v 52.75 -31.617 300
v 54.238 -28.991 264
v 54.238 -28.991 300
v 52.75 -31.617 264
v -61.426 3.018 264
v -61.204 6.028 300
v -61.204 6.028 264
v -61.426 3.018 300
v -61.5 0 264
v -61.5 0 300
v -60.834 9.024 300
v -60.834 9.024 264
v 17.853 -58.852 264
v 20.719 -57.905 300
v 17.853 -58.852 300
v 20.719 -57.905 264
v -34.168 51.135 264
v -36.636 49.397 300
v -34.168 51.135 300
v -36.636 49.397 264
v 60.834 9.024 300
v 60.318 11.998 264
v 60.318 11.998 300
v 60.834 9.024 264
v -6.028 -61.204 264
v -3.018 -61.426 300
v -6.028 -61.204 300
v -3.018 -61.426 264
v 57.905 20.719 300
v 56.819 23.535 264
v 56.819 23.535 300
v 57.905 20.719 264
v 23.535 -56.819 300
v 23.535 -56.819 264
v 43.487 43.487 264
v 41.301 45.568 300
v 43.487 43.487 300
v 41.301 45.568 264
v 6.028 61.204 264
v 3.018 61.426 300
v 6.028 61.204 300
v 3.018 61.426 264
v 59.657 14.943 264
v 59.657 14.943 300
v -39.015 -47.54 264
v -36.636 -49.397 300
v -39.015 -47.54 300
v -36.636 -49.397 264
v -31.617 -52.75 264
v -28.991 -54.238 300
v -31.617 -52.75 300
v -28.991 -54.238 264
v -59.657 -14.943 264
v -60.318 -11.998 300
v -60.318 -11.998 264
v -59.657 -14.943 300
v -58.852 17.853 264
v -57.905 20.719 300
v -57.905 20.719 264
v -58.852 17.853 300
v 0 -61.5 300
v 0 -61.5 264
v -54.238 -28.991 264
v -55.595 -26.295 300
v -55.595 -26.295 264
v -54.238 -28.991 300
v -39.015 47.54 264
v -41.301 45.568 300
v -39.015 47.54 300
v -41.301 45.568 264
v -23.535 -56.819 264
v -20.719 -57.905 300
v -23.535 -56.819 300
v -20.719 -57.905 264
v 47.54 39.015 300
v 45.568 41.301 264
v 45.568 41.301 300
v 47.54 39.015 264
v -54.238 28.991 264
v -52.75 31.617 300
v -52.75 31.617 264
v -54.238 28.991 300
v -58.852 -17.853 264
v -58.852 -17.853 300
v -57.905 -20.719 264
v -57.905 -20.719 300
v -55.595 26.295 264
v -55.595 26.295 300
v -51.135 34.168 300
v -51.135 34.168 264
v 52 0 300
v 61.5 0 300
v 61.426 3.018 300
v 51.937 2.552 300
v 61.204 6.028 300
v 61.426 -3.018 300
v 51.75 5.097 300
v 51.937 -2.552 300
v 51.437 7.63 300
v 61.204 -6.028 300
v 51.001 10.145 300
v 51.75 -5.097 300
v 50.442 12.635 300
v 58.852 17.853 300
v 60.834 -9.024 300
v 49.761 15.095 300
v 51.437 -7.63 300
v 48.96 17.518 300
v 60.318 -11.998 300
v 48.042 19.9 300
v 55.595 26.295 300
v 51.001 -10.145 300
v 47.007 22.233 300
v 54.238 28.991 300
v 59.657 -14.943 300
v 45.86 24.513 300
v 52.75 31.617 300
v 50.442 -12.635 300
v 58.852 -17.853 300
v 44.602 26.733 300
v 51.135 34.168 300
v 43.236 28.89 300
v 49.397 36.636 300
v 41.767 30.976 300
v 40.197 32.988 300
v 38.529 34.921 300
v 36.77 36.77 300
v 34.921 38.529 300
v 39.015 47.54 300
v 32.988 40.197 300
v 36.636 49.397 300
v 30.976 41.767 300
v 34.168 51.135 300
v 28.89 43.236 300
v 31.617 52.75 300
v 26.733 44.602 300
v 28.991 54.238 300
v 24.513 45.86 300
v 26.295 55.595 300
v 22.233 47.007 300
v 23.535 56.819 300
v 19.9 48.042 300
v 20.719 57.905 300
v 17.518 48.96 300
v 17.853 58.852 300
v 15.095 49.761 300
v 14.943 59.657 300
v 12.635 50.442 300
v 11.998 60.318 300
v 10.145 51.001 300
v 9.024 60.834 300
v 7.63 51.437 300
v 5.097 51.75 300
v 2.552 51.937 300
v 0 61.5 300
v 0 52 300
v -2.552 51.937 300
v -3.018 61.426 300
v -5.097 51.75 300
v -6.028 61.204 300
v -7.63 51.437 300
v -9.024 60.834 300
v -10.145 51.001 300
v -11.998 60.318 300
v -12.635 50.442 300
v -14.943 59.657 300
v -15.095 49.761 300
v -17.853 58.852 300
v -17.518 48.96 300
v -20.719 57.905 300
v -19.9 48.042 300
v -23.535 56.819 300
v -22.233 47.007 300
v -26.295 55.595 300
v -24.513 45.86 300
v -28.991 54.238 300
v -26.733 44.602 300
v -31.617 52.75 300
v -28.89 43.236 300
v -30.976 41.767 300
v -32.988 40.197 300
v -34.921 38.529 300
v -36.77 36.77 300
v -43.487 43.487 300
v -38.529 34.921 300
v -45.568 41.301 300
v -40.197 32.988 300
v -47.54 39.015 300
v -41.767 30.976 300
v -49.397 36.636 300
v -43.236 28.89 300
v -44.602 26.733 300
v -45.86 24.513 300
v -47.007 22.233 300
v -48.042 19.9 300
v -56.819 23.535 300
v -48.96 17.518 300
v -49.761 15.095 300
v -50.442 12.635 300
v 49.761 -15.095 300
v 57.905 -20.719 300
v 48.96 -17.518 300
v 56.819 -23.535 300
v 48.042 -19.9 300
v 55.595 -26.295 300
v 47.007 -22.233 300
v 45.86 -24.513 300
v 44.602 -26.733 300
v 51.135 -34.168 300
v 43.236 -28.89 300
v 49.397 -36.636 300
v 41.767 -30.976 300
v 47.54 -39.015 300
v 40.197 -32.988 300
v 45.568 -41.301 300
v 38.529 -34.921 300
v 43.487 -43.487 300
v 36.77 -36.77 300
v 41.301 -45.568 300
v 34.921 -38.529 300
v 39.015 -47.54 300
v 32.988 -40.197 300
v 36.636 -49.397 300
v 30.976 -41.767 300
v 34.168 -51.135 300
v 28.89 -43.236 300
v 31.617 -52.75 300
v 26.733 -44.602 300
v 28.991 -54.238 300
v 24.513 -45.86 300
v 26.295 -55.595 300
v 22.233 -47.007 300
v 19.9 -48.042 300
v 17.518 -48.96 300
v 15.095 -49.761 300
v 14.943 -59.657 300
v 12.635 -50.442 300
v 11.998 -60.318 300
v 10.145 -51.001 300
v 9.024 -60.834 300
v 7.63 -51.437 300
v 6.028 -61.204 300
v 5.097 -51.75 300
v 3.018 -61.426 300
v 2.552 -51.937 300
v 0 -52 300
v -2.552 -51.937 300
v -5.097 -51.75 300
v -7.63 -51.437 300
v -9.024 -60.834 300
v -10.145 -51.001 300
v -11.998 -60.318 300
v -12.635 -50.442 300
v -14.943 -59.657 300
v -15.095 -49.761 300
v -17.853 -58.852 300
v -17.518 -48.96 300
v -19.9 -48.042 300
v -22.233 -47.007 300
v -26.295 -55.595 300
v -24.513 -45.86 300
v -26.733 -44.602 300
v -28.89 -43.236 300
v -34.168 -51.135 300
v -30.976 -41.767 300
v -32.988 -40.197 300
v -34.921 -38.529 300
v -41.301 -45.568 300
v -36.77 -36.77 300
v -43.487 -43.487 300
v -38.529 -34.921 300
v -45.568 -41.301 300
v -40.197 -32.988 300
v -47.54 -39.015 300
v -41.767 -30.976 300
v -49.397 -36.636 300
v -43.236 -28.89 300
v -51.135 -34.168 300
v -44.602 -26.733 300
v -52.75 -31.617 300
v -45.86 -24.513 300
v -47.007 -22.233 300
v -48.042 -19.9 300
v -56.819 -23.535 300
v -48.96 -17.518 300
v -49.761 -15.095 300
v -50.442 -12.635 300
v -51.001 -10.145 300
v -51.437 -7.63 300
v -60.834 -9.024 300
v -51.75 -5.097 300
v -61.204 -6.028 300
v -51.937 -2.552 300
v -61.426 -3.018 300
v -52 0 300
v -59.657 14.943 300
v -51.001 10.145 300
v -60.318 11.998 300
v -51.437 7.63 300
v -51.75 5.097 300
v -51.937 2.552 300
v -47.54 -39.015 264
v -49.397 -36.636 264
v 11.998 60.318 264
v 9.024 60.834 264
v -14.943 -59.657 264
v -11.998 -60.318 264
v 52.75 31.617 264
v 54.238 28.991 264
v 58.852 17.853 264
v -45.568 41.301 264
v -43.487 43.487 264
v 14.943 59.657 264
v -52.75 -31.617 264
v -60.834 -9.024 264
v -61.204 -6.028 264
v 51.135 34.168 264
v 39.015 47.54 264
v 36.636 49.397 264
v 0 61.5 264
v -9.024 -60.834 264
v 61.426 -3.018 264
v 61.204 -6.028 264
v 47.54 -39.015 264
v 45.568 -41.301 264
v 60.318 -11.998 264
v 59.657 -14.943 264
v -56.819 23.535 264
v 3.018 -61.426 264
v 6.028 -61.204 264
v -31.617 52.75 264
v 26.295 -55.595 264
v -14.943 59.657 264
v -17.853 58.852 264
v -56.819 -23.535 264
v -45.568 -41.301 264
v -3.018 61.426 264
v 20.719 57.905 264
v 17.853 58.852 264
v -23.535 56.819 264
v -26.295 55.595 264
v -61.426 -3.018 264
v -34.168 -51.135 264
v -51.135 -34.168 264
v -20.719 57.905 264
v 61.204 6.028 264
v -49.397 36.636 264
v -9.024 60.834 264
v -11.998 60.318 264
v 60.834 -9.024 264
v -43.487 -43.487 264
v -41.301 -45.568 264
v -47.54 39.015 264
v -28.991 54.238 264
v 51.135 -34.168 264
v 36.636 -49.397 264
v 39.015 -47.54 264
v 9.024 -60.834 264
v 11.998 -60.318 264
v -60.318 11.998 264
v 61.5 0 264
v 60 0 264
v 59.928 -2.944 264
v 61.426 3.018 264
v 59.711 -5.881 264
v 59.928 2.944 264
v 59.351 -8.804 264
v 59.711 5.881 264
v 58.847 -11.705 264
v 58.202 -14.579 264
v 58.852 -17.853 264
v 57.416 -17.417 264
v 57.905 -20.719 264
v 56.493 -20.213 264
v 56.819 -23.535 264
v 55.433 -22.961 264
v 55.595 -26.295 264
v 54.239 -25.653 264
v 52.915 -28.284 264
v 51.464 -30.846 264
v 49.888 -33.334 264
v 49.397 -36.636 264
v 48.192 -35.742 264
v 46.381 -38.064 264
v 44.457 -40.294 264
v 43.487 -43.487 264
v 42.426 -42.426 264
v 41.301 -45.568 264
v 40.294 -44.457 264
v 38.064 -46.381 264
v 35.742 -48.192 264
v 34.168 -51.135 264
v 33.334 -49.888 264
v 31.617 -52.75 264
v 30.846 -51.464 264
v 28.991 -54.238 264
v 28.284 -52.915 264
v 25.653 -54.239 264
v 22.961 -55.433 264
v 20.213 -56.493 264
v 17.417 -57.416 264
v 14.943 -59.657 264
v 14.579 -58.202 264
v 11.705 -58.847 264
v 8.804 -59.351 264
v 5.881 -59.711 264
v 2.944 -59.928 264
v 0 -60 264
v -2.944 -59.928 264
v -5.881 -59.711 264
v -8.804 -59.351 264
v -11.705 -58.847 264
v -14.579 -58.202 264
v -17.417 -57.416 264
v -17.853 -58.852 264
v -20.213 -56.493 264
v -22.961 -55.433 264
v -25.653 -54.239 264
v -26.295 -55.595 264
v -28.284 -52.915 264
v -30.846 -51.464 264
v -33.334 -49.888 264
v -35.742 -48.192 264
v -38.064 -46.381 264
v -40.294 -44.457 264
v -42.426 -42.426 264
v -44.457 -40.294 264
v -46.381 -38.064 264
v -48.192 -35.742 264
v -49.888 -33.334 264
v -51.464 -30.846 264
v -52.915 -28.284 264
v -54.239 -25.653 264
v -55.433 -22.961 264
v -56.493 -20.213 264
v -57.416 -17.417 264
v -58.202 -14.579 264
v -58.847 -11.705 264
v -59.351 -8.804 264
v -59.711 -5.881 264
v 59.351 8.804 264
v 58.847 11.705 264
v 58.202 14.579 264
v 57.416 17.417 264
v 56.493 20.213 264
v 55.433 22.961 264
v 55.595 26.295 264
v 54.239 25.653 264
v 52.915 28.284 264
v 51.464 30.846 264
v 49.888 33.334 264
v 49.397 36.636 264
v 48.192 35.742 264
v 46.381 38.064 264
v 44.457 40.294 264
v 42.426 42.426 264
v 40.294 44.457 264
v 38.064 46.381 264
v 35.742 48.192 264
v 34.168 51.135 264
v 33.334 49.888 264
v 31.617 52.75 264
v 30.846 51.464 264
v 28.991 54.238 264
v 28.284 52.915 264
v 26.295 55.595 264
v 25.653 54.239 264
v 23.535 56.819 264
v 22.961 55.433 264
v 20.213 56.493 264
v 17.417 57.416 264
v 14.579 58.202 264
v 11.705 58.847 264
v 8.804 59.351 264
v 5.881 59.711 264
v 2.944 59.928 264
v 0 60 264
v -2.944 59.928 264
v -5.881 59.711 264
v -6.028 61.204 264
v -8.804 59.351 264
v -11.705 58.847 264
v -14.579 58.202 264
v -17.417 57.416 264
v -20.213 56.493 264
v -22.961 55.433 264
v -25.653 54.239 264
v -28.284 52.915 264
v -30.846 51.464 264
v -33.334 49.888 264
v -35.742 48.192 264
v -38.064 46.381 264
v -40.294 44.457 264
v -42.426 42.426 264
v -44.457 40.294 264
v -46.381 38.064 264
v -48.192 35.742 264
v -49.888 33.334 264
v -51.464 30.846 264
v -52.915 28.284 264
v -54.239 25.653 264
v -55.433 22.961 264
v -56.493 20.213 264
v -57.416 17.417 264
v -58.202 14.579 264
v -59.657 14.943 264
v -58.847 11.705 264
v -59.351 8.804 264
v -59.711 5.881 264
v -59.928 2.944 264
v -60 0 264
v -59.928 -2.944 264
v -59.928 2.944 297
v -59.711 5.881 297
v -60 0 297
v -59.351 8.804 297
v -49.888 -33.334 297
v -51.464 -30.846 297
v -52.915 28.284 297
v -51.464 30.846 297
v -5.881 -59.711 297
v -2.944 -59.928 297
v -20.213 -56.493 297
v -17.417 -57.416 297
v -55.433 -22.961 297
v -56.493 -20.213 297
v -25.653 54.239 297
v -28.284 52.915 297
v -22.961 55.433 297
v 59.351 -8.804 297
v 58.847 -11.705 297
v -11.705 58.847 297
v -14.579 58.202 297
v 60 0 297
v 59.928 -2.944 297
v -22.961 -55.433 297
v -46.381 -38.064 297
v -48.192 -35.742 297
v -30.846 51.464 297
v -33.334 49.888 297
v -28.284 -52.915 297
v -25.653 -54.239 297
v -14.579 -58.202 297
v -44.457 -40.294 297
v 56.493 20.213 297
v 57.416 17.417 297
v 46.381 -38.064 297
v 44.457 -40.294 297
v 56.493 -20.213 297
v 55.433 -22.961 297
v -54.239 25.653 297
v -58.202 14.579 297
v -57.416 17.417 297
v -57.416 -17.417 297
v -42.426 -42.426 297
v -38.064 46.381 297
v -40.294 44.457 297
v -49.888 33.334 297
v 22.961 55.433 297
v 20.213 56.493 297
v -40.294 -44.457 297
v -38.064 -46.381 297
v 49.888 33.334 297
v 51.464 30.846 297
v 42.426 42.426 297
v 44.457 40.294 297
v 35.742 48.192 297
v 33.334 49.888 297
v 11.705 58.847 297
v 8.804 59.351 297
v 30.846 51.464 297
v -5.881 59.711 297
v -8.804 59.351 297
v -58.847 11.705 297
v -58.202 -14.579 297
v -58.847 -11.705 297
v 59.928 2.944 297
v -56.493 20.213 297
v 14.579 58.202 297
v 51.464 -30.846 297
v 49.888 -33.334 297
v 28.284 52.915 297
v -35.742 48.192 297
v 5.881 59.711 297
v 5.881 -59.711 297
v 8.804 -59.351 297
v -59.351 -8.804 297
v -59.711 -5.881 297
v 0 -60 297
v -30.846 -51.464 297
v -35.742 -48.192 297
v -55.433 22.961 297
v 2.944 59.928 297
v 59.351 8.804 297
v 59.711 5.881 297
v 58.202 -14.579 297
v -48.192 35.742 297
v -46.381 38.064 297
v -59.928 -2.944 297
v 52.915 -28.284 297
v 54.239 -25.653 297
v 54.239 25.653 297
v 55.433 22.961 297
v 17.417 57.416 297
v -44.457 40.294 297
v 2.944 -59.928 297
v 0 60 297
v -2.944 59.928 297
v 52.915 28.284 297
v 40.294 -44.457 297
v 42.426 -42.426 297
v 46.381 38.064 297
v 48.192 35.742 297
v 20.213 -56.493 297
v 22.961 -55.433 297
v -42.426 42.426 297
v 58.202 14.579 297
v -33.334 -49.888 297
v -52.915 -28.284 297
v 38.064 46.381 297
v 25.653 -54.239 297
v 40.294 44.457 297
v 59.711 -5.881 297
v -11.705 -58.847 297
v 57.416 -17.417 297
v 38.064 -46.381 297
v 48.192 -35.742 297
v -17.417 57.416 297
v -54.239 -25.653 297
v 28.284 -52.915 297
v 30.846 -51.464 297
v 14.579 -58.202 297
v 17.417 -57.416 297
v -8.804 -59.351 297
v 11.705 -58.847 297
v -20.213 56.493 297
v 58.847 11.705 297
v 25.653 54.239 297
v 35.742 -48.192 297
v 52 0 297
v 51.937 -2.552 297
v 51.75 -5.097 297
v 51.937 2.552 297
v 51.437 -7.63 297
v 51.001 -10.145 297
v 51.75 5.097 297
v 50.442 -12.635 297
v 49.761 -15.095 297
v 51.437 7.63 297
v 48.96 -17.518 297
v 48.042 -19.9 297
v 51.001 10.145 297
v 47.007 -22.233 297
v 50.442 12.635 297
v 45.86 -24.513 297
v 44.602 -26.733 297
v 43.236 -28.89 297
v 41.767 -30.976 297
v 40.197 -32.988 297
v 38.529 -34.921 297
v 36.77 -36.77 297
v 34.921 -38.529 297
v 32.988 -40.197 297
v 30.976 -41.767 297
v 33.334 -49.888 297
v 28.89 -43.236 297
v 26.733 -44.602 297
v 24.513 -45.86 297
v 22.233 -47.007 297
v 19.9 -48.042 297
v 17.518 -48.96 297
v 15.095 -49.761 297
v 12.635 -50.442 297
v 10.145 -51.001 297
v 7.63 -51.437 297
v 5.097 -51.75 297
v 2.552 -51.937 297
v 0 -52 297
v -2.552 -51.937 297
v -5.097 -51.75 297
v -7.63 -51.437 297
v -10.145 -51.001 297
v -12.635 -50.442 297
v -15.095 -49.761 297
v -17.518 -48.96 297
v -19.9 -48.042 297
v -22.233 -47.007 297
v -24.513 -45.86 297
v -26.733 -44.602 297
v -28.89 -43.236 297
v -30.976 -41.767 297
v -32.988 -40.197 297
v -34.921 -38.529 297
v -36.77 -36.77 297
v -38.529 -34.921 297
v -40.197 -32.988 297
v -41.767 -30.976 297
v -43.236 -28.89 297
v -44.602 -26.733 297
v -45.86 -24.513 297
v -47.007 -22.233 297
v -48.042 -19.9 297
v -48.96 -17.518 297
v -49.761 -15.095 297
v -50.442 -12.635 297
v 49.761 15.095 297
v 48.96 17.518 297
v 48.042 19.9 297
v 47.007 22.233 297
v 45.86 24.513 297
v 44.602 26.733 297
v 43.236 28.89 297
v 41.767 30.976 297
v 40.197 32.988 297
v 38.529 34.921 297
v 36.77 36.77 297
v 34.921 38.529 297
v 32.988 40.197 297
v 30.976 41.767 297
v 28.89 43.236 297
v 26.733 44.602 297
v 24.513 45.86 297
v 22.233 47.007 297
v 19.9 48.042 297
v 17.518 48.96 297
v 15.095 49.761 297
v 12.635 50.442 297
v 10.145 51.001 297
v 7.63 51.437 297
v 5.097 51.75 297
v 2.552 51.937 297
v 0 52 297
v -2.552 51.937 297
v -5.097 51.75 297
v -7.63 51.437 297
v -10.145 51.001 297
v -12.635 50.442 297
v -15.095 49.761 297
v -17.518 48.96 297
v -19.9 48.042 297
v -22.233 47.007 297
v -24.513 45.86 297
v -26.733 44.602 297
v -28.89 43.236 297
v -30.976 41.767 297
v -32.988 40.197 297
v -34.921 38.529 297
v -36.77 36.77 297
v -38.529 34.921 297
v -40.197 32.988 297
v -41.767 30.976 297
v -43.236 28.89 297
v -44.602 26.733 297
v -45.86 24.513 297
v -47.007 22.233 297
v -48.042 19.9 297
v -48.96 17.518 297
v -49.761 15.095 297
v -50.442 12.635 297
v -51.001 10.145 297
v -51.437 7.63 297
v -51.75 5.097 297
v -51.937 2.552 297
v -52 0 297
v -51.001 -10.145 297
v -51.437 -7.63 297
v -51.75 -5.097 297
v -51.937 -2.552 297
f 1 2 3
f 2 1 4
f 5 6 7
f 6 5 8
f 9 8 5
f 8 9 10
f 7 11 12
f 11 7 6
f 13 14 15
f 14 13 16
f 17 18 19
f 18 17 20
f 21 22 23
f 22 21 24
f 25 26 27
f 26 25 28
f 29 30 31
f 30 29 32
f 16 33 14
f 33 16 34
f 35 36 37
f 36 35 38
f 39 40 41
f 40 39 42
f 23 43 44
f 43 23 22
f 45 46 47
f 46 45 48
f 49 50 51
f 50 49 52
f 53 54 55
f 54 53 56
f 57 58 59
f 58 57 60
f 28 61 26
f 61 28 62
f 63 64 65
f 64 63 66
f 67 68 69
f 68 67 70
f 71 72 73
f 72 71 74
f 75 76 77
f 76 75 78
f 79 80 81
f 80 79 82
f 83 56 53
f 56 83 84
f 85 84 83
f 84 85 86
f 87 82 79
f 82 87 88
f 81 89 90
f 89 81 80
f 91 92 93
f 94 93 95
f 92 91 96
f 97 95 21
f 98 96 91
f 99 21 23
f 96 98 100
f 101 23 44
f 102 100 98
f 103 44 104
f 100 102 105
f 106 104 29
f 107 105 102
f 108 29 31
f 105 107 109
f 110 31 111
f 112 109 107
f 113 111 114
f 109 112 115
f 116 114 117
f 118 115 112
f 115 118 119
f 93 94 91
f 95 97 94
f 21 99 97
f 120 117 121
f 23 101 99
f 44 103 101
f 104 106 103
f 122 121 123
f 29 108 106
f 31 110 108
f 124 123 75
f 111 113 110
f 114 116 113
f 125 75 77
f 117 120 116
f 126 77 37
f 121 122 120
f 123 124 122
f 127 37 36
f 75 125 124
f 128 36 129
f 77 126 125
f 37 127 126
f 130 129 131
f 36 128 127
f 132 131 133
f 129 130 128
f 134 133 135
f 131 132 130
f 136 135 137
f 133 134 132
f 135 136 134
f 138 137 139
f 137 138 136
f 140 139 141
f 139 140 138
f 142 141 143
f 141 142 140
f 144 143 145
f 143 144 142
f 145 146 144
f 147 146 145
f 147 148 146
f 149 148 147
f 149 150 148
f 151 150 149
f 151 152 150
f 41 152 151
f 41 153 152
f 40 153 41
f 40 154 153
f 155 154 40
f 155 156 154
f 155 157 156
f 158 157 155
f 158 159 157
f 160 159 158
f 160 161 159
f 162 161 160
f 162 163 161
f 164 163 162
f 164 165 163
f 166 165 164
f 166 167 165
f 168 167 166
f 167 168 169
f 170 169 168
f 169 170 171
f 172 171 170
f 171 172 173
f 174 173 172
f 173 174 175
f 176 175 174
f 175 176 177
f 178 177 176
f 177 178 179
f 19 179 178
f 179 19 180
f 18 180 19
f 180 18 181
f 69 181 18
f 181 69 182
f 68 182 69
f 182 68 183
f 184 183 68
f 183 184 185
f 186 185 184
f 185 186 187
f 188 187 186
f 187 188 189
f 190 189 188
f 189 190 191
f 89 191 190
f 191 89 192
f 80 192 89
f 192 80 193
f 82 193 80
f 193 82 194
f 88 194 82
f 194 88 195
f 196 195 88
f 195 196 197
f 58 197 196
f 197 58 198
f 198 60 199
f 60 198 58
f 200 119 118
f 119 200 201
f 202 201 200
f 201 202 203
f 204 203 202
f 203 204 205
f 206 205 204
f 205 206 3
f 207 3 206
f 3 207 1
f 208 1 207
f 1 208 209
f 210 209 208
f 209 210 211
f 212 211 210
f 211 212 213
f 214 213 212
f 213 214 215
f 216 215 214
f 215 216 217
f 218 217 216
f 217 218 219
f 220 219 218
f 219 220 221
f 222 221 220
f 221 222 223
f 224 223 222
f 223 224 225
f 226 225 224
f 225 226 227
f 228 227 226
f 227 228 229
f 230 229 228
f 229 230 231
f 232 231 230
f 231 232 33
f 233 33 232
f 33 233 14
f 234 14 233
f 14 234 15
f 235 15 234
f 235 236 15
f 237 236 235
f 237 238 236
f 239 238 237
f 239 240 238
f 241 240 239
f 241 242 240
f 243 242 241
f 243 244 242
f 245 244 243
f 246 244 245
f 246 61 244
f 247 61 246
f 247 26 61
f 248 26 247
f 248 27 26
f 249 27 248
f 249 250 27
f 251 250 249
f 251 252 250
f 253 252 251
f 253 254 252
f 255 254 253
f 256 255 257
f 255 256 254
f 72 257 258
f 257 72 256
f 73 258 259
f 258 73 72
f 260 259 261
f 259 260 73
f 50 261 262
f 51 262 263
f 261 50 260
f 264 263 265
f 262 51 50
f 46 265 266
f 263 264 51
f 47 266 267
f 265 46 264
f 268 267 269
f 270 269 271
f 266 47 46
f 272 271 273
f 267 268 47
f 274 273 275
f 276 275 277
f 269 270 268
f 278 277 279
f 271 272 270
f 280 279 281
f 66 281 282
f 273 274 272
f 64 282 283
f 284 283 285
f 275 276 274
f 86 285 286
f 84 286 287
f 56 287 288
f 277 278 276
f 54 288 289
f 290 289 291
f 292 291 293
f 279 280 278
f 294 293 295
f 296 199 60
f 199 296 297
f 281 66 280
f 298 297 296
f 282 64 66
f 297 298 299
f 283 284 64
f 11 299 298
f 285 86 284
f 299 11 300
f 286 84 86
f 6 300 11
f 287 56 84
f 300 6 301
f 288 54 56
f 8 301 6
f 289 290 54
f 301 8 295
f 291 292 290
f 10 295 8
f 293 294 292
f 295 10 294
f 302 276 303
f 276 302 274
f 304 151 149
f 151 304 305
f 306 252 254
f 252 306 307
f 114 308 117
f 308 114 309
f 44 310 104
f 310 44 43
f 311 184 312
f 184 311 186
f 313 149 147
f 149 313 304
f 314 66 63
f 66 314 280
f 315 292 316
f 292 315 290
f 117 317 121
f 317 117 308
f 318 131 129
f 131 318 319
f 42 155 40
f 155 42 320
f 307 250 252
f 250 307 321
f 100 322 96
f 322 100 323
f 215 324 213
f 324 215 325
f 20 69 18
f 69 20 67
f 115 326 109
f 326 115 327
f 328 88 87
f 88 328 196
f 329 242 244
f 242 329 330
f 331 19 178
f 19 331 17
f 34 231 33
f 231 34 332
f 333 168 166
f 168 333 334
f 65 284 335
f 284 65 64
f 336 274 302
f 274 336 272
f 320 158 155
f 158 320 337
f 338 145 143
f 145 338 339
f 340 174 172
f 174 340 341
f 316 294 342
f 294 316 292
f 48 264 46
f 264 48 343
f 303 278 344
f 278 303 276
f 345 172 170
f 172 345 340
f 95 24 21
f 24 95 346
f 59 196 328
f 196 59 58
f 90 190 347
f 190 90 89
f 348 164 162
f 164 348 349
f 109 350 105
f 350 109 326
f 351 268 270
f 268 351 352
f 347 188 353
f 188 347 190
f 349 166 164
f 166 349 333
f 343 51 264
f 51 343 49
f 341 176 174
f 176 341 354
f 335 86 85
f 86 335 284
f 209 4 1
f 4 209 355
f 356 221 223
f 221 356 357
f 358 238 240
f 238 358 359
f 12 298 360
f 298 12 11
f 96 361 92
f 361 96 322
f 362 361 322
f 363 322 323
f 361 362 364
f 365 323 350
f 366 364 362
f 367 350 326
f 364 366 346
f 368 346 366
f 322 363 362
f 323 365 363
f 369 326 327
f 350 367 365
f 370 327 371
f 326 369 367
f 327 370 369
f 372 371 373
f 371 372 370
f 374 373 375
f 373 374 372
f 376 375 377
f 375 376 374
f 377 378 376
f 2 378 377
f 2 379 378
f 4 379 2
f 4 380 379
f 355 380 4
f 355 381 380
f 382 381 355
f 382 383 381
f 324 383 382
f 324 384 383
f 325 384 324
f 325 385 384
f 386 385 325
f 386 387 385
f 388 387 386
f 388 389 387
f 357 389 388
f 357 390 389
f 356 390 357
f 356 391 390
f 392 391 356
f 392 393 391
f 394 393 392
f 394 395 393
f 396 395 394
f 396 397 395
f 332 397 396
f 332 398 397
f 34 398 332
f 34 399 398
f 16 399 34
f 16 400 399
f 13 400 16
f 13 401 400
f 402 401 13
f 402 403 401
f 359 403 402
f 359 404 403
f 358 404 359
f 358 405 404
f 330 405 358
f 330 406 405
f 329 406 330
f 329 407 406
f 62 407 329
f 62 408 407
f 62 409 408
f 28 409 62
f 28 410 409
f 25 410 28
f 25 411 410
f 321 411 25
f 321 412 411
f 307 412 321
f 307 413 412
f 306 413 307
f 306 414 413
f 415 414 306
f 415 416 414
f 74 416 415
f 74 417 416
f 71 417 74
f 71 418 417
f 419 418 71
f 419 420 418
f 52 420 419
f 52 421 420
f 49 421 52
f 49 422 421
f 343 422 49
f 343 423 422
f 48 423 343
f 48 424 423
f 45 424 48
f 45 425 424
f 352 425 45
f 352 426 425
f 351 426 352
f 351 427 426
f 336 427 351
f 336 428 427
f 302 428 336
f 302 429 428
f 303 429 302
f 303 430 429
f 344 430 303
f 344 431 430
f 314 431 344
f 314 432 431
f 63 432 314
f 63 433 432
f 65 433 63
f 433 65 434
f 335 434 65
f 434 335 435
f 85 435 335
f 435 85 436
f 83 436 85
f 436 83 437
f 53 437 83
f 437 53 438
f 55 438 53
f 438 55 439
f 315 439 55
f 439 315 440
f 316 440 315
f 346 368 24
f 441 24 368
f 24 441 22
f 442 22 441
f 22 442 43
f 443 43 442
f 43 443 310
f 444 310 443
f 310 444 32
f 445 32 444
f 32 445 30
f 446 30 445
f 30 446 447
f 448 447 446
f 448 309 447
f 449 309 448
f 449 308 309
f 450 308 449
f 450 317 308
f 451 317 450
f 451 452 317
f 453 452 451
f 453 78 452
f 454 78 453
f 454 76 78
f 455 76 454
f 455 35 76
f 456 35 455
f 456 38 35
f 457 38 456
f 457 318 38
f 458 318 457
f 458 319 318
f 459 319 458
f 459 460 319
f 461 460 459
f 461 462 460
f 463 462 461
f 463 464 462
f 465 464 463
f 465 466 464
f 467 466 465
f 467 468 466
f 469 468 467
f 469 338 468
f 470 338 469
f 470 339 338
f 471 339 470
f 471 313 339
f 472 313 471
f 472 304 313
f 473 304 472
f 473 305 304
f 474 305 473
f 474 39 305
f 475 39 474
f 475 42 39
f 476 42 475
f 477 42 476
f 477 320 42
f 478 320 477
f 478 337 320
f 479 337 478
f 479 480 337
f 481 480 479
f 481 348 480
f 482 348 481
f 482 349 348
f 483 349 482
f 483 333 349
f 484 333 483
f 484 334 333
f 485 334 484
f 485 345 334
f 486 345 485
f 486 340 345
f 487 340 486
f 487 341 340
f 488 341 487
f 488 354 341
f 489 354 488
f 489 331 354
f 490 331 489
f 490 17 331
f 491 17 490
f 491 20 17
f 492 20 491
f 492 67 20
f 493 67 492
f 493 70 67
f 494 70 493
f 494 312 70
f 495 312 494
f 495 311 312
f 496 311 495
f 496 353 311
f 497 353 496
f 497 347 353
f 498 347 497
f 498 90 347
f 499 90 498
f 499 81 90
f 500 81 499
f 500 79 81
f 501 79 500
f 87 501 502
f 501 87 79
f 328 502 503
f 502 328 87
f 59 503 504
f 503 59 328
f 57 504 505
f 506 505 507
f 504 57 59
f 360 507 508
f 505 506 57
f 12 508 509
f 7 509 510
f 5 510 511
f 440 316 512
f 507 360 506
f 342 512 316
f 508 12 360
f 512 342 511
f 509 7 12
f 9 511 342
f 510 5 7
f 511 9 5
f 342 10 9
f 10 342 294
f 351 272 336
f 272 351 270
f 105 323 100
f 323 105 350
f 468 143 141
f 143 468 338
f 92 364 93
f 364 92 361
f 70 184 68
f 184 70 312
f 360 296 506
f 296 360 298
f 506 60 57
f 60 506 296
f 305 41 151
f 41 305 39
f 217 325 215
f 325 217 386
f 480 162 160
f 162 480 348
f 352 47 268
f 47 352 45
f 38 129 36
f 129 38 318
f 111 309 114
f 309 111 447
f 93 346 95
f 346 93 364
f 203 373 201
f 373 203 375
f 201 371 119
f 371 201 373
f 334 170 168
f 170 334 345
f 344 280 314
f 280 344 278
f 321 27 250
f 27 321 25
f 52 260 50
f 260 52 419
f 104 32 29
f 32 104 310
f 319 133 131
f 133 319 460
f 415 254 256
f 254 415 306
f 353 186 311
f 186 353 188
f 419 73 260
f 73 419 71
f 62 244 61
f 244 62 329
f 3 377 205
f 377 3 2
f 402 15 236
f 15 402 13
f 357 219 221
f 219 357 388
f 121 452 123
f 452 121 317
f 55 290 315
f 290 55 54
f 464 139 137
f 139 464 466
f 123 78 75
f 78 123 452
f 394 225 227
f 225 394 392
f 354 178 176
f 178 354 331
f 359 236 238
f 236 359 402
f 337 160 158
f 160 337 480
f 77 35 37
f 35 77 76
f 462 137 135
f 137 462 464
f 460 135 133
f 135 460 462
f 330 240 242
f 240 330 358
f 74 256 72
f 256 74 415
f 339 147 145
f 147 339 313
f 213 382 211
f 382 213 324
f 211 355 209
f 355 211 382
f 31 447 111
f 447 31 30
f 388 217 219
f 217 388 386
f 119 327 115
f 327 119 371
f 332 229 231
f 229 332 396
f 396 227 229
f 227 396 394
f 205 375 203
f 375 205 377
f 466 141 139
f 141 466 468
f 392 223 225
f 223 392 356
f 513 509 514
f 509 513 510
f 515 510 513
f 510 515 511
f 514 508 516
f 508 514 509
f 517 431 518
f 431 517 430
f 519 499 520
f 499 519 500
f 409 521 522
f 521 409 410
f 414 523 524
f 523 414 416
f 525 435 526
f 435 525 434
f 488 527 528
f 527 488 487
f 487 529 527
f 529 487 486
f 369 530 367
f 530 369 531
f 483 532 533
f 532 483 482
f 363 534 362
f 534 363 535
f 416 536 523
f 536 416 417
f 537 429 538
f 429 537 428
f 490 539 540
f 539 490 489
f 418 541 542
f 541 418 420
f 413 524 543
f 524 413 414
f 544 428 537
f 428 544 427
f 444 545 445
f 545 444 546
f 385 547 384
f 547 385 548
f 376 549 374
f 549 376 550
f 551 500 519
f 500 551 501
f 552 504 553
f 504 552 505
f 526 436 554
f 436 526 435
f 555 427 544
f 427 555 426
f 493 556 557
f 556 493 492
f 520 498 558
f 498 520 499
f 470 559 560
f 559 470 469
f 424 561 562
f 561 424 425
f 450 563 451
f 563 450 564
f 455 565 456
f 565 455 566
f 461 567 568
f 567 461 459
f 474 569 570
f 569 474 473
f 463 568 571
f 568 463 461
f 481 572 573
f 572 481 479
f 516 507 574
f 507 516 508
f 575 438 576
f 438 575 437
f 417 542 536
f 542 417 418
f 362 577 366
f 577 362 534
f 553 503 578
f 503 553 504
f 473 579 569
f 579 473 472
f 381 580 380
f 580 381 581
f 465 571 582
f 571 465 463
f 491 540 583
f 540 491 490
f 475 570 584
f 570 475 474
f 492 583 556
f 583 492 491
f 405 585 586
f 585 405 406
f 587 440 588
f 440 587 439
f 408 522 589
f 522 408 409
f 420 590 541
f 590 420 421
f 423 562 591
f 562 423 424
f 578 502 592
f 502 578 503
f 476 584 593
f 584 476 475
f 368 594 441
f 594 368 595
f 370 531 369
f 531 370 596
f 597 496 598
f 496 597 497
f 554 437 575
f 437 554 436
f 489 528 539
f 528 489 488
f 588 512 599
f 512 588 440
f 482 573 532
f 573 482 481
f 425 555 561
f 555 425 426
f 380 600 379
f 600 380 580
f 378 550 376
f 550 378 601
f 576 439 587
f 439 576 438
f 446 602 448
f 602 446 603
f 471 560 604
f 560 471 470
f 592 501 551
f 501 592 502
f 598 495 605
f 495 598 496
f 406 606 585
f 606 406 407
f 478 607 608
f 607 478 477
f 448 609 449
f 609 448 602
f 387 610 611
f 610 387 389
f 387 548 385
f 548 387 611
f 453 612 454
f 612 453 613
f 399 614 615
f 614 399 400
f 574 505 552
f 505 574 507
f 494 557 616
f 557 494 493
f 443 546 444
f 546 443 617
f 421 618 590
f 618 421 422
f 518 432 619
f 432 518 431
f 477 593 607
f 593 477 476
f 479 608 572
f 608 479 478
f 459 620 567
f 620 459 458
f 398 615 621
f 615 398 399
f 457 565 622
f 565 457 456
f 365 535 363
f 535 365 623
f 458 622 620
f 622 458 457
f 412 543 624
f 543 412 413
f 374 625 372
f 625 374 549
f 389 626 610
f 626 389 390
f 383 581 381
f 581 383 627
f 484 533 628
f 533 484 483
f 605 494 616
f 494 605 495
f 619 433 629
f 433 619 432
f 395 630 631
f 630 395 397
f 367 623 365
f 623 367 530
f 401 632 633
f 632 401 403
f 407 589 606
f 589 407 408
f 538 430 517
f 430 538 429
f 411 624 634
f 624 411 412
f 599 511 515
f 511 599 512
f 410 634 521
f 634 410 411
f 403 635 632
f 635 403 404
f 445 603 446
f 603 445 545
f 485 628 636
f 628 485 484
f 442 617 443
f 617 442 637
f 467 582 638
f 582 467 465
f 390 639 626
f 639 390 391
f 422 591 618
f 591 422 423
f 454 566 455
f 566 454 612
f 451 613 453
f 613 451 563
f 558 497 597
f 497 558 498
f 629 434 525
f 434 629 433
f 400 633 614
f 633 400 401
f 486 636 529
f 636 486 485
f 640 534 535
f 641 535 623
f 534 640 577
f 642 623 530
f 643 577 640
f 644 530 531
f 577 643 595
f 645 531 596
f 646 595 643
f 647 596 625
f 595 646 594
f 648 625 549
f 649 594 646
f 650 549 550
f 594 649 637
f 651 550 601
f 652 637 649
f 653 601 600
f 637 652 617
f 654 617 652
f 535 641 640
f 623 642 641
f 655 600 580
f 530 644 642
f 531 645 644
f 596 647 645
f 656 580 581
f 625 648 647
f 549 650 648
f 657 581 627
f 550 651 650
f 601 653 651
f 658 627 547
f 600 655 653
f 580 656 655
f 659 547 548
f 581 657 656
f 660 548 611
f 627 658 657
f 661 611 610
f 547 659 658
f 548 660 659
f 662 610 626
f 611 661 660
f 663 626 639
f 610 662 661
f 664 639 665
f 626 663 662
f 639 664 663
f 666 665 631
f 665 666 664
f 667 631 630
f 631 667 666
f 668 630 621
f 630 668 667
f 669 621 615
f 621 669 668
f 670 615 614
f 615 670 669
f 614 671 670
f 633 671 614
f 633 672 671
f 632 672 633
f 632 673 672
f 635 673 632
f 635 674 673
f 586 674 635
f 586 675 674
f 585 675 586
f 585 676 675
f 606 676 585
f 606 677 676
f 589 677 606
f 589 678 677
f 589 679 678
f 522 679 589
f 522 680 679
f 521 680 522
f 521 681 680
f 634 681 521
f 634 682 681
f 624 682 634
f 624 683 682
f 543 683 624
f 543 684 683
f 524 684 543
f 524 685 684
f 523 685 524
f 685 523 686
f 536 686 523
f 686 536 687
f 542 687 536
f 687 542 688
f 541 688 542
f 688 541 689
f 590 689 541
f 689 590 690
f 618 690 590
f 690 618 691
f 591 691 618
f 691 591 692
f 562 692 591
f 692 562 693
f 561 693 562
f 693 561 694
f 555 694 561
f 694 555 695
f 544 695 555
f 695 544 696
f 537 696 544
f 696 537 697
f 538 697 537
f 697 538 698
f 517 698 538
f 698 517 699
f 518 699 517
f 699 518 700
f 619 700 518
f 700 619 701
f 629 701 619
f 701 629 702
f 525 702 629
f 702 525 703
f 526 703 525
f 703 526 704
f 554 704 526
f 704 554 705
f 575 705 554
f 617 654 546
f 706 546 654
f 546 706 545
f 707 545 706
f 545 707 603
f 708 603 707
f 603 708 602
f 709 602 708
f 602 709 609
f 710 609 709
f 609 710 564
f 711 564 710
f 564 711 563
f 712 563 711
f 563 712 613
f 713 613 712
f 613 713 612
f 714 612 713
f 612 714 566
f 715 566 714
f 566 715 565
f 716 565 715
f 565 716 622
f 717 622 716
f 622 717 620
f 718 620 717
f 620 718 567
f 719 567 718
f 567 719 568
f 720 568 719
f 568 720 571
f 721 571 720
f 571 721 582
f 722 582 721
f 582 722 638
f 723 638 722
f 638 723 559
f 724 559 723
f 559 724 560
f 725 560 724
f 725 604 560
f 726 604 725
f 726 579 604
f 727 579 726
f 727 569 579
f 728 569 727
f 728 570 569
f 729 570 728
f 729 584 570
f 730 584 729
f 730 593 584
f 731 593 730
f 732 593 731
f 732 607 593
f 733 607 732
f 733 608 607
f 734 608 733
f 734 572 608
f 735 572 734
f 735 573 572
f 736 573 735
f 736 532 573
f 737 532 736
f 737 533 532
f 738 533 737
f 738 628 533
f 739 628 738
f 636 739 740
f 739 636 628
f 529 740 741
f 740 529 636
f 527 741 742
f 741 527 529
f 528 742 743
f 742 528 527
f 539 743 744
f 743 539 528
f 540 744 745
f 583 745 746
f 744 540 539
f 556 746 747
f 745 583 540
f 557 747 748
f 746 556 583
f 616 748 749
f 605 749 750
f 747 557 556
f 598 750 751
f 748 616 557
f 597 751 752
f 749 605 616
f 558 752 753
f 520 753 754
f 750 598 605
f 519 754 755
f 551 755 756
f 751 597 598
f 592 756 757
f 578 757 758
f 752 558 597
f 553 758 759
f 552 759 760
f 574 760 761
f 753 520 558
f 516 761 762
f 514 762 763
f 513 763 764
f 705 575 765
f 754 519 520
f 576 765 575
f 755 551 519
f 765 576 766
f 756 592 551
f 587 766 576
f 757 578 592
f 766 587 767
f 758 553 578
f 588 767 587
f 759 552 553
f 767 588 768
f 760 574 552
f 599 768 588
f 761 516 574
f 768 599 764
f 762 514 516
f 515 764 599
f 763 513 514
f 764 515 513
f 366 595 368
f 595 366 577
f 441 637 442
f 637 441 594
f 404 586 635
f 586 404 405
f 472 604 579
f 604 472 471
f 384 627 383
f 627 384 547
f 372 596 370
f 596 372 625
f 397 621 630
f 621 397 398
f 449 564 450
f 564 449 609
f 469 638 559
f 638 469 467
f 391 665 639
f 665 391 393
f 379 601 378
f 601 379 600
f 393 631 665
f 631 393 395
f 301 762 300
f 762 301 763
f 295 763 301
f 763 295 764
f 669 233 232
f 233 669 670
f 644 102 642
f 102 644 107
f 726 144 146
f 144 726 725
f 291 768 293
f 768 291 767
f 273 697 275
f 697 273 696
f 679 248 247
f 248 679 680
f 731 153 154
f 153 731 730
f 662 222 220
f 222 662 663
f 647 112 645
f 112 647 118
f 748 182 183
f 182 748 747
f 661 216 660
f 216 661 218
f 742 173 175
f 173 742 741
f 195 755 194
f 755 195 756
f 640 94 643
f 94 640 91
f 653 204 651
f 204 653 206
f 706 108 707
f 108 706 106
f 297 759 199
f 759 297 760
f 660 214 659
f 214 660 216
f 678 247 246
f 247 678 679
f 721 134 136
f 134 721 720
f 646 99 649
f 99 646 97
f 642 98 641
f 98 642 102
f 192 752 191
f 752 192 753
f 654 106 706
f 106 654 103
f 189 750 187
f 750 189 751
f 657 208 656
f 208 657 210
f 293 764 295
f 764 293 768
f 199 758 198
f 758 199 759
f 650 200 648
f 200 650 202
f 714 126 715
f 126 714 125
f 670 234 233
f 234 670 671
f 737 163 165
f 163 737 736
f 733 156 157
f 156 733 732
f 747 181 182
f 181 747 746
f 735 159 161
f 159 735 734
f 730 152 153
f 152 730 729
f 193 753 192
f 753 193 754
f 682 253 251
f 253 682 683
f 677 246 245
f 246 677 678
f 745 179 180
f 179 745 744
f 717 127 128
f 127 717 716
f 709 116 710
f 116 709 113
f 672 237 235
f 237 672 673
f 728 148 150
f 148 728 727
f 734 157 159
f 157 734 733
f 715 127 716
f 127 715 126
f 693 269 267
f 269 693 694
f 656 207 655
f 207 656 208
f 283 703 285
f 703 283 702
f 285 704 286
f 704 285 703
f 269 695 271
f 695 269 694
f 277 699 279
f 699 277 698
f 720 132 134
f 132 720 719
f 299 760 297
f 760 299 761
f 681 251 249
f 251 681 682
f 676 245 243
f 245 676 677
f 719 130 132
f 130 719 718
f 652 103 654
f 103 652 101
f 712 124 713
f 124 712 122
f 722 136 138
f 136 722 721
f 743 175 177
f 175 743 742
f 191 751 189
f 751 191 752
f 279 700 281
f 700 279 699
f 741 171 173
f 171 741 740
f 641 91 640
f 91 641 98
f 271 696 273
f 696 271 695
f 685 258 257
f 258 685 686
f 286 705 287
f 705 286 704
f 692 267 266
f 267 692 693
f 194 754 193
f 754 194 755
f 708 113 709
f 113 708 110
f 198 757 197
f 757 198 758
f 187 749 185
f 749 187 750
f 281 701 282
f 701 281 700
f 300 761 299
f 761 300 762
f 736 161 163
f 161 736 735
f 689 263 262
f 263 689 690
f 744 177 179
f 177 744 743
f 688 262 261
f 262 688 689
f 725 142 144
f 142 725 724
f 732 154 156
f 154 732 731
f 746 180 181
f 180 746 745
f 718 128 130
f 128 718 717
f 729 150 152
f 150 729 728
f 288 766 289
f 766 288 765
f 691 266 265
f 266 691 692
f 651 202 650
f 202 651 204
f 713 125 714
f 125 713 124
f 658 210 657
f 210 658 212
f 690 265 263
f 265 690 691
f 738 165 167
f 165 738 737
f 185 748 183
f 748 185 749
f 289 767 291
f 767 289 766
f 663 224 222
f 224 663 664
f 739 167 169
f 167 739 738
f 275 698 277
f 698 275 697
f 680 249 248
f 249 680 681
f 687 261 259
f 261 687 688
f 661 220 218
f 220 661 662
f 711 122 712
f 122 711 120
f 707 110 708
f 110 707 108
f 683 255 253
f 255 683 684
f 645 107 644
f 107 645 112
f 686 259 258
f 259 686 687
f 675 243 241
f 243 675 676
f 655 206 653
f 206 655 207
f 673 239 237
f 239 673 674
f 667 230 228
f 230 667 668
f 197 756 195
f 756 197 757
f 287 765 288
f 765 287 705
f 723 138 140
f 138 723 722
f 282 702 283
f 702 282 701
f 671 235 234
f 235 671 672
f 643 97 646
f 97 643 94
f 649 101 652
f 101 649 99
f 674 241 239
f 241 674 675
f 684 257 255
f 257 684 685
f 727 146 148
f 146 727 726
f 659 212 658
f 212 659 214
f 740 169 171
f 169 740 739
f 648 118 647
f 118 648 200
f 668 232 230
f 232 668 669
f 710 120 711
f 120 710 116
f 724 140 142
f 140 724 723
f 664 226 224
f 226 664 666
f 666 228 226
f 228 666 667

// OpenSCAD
// TODO
// Compass Rose
// Stop for Top
// Cable Hole

// Everything is in mm

smidge = 0.2;
outsideDiameter = 120;
capThickness = 3.0;
capHeight = 10*capThickness;
cameraHoleDiameter=51;
supportHeight = 23;
cameraScrewHoleDiameter= 6.2;
cameraDepth=23;
baseHeight = 120;
airHoleSize=5;
cordHoleDiameter=10;
usbCHeight=7;
usbCWidth=13;
domeHoleFromOutside = 4.5;
overhangWidth=10;
domeThickness = 3.0;
overhangHeight = capHeight+capThickness + domeThickness;
grommetLength = capThickness*4;
usbHoleFromBot = 20;





module overhang ()
{
    difference ()
    {
        difference ()
        {
            cylinder (h = overhangHeight, d = outsideDiameter+capThickness, center = false, $fn=128);
            translate ([0,0, capThickness])
            {
              cylinder (h = overhangHeight, d = outsideDiameter, center=false, $fn=128);
            }
        }
        cylinder (h = capHeight, d = outsideDiameter-overhangWidth-capThickness*2, center = false, $fn=128);
    }
}

module cap ()
{
    difference() 
    {
        difference ()
        {
            cylinder (h = capHeight, d = outsideDiameter, center = false, $fn=128);
            translate ([0,0, capThickness])
            {
            cylinder (h = capHeight, d = outsideDiameter-capThickness, center=false, $fn=128);
            }
        }
        translate ([0,0, -capThickness])
        {         
            cylinder (h = capHeight, d = cameraHoleDiameter, center=false, $fn=128);
        }
    }
}

module cameraSupport ()
{
    difference() 
    {
        difference ()
        {
            cylinder (h = supportHeight + capThickness, d = outsideDiameter-capThickness-smidge, center = false, $fn=128);
            translate ([0,0, capThickness])
            {
                cylinder (h = supportHeight, d = outsideDiameter-capThickness-smidge-capThickness, center=false, $fn=128);
            }
        }
        translate ([0,0, -capThickness])
        {         
            cylinder (h = capHeight, d = cameraScrewHoleDiameter, center=false, $fn=128);
        }
    }
}
module base()
{
     difference ()
        {
            cylinder (h = baseHeight, d = outsideDiameter, center = false, $fn=128);
            translate ([0,0, capThickness])
            {
            cylinder (h = baseHeight, d = outsideDiameter-capThickness, center=false, $fn=128);
            }
        }
}

module usbHole ()
{
    translate ([-outsideDiameter/2,-usbCWidth/2,usbHoleFromBot])
    {
        rotate([0,90,0])
        {
            cube([usbCHeight, usbCWidth, grommetLength],false);
            translate([usbCHeight/2,0,0])
            {
                cylinder(h= grommetLength, d=usbCHeight, center=false,$fn=128);
            }
            translate([usbCHeight/2,usbCWidth,0])
            {
                cylinder(h= grommetLength, d=usbCHeight, center=false,$fn=128);
            }
            
        
        }
    }
}


module cordHole()
{
    translate ([-outsideDiameter/2,0,usbHoleFromBot-usbCHeight/2])
    {
        rotate([0,90,0])
        {
            cylinder(h= grommetLength, d = 5, center=false, $fn=128);
        }
    }
}

module airholePattern()
{
    for ( i = [0 : 45 : 360])
    {
        dx = cos (i) * outsideDiameter/2 * .75;
        dy = sin (i) * outsideDiameter/2 * .75;
        
        translate([dx, dy, -5])
        {            
            cylinder(h= capThickness*10, r = airHoleSize/2, center=false,$fn=128);
        }
    }
}


module p1()
{
    difference ()
    {
        cap();
        airholePattern ();
    }
}
module p2 ()
{
    difference ()
    {
        difference ()
        {
            cameraSupport();
            airholePattern();
        }
        translate([outsideDiameter/2 * .75,0,0]) cube([10,20,100],center=true);
    }
}


module gromett()
{


    difference()
    {
        difference ()
        {
            usbHole();
            cordHole();        
        }
    
        translate ([-outsideDiameter*2,0,usbHoleFromBot])
        {
            rotate([0,90,0])
            {
                 cube([usbCHeight, .5, grommetLength*100],false);                   
            }
    }
    
    }
}

module testUsbHole()
{
    difference ()
    {
        translate ([-outsideDiameter/2, -50,0])
        {
        cube([capThickness,50,20], false);
        }
        usbHole();
    }
}


module handle ()
{
    difference ()
    {
        union ()
        {
            cube ([75, 12, 6]);
            translate ([75-12/2, 12/2,0]) cylinder(h= 8, d = 10, center=false,$fn=128);
        }
        translate ([75-12/2, 12/2,0])
        {
            cylinder(h= 20, d = 3, center=true,$fn=128);
        }
    }
}
module p3()
{
    
    difference ()
    {
        base();
        usbHole();
    }
}





//p3();
//translate([0,0,160]) {p2();}
////translate([0,0,260])rotate ([0, 180, 0]) {p1();}
translate ([0, 0, 300]) rotate ([0, 180, 0]) {overhang();}

//translate ([150, 0, 0]) gromett();
